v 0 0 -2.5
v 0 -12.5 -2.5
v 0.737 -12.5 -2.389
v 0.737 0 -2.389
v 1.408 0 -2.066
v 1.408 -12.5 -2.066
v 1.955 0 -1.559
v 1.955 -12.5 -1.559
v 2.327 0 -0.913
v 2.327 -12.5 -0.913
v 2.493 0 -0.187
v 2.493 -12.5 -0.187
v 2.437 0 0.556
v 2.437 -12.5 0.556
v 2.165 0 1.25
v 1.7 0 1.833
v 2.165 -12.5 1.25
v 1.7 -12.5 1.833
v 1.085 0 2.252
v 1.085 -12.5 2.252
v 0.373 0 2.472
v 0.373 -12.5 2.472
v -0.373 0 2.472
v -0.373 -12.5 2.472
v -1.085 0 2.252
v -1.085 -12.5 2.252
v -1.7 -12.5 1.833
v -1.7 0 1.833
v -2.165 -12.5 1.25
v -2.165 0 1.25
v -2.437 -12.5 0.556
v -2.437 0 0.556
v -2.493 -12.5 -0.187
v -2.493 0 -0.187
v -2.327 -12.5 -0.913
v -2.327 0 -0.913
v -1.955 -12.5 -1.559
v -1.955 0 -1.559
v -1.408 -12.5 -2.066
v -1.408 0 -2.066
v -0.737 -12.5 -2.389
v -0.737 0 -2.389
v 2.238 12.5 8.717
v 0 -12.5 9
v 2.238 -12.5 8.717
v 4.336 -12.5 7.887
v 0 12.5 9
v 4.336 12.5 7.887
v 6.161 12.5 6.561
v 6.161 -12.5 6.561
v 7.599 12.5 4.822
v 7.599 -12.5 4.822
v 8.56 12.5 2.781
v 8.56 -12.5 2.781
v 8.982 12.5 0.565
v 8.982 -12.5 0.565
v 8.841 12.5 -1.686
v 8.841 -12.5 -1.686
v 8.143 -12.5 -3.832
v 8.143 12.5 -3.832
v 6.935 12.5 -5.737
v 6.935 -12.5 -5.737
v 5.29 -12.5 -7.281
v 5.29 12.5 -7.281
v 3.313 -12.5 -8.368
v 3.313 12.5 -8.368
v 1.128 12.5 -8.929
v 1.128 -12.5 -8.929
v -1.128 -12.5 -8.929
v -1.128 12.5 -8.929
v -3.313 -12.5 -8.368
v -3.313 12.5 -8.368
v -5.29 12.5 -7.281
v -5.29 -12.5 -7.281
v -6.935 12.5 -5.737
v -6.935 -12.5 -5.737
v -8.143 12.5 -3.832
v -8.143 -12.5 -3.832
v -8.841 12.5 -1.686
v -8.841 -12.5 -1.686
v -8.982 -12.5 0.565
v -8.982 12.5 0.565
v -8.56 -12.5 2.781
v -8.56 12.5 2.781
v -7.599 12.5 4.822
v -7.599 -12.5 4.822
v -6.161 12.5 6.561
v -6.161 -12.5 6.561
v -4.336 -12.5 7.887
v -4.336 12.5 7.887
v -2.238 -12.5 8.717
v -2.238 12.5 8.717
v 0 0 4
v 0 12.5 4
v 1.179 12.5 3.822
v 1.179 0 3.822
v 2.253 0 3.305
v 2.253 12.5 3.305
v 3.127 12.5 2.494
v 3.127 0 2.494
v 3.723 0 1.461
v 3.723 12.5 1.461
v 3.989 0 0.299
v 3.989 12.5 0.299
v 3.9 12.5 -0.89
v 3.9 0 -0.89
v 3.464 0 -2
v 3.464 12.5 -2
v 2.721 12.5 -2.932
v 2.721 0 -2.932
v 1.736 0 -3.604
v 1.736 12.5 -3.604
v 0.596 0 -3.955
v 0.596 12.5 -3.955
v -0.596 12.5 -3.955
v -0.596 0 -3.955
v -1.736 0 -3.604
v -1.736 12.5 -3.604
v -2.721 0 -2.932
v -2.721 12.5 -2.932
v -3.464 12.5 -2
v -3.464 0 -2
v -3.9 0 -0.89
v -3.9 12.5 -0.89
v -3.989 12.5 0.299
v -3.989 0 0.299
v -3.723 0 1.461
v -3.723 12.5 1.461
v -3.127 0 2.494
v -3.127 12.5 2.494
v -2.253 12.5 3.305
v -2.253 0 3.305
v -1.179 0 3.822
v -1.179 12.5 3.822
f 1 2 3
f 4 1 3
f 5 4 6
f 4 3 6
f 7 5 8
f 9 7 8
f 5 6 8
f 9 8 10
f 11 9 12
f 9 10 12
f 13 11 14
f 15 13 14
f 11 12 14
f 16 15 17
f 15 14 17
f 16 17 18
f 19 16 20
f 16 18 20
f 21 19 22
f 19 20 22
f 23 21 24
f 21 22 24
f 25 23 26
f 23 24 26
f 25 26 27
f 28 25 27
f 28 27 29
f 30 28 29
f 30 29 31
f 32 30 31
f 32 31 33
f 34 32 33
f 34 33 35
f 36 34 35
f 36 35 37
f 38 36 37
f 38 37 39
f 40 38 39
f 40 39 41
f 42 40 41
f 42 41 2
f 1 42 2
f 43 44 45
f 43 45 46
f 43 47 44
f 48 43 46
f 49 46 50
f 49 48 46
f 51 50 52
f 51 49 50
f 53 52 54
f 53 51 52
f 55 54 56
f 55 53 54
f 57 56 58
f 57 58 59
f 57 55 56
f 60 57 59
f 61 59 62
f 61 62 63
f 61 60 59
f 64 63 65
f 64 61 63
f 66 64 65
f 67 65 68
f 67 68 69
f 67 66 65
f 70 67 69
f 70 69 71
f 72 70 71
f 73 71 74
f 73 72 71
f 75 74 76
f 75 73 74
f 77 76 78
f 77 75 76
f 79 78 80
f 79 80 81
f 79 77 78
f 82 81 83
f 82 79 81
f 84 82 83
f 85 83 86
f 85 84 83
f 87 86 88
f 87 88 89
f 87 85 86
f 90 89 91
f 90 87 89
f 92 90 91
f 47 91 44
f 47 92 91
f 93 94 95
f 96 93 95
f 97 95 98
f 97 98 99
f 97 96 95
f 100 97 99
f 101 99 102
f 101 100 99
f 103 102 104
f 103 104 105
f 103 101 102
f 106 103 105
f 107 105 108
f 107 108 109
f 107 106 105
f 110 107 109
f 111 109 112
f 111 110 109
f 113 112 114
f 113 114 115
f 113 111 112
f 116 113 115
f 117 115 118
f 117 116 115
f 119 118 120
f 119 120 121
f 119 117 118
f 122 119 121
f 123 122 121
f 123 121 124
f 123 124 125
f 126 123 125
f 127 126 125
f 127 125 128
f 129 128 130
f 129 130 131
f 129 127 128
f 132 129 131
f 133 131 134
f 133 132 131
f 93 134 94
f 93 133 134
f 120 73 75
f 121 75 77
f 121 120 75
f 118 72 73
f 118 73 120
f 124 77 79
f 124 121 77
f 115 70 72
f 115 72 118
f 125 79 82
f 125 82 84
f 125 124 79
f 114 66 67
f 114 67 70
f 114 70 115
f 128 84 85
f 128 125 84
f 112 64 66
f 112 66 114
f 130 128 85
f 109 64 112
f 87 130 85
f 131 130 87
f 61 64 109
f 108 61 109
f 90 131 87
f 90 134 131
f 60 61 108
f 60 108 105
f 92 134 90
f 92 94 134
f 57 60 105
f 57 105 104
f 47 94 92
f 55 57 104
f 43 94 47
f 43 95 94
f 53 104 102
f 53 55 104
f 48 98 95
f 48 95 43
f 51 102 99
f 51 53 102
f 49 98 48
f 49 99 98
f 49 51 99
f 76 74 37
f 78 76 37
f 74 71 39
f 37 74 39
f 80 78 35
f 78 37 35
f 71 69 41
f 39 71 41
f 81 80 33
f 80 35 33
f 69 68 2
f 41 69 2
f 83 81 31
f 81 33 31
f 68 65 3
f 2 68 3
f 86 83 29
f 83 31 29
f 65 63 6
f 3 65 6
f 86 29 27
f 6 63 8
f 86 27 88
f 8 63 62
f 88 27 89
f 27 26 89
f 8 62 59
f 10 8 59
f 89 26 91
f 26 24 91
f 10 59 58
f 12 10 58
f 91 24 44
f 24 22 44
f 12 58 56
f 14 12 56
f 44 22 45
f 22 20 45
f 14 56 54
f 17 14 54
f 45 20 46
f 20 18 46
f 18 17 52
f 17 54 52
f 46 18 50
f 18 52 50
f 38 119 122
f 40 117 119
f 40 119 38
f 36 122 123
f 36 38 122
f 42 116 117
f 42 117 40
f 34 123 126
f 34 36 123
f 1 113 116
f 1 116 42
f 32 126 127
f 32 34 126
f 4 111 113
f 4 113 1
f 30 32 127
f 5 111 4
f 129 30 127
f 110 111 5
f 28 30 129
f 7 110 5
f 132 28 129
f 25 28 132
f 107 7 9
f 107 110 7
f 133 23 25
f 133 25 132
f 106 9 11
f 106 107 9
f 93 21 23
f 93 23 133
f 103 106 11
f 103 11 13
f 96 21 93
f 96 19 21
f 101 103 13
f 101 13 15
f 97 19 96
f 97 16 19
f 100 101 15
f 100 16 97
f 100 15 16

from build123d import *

# Parameters (mm, degrees)
SKETCH1_R           = 9
BOSS_EXTRUDE1_DEPTH = 12.5
CUT_EXTRUDE1_START  = -12.5
SKETCH2_R           = 4
CUT_EXTRUDE1_DEPTH  = 12.5
CUT_EXTRUDE2_REACH  = 30.054
SKETCH3_R           = 2.5


with BuildPart() as part:
    # Sketch1 → Boss-Extrude1 (new, symmetric)
    with BuildSketch(Plane(origin=(0, 0, 0), x_dir=(1, 0, 0), z_dir=(0, 1, 0))):
        with Locations(Location((0, 0, 0), (0, 0, 270))):
            Circle(SKETCH1_R)
    extrude(amount=BOSS_EXTRUDE1_DEPTH, both=True)

    # Sketch2 → Cut-Extrude1 (cut)
    with BuildSketch(Plane(origin=(0, 12.5, 0), x_dir=(1, 0, 0), z_dir=(0, 1, 0)).offset(CUT_EXTRUDE1_START)):
        with Locations(Location((0, 0, 0), (0, 0, 270))):
            Circle(SKETCH2_R)
    extrude(amount=CUT_EXTRUDE1_DEPTH, mode=Mode.SUBTRACT)

    # Sketch3 → Cut-Extrude2 (cut, up to next)
    with BuildSketch(Plane.XZ.offset(12.5), mode=Mode.PRIVATE) as cut_extrude2_sk1:
        with Locations(Location((0, 0, 0), (0, 0, 270))):
            Circle(SKETCH3_R)
    cut_extrude2_tool1 = extrude(cut_extrude2_sk1.sketch, amount=-CUT_EXTRUDE2_REACH, mode=Mode.PRIVATE) & part.part
    add(cut_extrude2_tool1.solids().sort_by_distance((0, -12.5, 0))[0], mode=Mode.SUBTRACT)


solid = part.part
